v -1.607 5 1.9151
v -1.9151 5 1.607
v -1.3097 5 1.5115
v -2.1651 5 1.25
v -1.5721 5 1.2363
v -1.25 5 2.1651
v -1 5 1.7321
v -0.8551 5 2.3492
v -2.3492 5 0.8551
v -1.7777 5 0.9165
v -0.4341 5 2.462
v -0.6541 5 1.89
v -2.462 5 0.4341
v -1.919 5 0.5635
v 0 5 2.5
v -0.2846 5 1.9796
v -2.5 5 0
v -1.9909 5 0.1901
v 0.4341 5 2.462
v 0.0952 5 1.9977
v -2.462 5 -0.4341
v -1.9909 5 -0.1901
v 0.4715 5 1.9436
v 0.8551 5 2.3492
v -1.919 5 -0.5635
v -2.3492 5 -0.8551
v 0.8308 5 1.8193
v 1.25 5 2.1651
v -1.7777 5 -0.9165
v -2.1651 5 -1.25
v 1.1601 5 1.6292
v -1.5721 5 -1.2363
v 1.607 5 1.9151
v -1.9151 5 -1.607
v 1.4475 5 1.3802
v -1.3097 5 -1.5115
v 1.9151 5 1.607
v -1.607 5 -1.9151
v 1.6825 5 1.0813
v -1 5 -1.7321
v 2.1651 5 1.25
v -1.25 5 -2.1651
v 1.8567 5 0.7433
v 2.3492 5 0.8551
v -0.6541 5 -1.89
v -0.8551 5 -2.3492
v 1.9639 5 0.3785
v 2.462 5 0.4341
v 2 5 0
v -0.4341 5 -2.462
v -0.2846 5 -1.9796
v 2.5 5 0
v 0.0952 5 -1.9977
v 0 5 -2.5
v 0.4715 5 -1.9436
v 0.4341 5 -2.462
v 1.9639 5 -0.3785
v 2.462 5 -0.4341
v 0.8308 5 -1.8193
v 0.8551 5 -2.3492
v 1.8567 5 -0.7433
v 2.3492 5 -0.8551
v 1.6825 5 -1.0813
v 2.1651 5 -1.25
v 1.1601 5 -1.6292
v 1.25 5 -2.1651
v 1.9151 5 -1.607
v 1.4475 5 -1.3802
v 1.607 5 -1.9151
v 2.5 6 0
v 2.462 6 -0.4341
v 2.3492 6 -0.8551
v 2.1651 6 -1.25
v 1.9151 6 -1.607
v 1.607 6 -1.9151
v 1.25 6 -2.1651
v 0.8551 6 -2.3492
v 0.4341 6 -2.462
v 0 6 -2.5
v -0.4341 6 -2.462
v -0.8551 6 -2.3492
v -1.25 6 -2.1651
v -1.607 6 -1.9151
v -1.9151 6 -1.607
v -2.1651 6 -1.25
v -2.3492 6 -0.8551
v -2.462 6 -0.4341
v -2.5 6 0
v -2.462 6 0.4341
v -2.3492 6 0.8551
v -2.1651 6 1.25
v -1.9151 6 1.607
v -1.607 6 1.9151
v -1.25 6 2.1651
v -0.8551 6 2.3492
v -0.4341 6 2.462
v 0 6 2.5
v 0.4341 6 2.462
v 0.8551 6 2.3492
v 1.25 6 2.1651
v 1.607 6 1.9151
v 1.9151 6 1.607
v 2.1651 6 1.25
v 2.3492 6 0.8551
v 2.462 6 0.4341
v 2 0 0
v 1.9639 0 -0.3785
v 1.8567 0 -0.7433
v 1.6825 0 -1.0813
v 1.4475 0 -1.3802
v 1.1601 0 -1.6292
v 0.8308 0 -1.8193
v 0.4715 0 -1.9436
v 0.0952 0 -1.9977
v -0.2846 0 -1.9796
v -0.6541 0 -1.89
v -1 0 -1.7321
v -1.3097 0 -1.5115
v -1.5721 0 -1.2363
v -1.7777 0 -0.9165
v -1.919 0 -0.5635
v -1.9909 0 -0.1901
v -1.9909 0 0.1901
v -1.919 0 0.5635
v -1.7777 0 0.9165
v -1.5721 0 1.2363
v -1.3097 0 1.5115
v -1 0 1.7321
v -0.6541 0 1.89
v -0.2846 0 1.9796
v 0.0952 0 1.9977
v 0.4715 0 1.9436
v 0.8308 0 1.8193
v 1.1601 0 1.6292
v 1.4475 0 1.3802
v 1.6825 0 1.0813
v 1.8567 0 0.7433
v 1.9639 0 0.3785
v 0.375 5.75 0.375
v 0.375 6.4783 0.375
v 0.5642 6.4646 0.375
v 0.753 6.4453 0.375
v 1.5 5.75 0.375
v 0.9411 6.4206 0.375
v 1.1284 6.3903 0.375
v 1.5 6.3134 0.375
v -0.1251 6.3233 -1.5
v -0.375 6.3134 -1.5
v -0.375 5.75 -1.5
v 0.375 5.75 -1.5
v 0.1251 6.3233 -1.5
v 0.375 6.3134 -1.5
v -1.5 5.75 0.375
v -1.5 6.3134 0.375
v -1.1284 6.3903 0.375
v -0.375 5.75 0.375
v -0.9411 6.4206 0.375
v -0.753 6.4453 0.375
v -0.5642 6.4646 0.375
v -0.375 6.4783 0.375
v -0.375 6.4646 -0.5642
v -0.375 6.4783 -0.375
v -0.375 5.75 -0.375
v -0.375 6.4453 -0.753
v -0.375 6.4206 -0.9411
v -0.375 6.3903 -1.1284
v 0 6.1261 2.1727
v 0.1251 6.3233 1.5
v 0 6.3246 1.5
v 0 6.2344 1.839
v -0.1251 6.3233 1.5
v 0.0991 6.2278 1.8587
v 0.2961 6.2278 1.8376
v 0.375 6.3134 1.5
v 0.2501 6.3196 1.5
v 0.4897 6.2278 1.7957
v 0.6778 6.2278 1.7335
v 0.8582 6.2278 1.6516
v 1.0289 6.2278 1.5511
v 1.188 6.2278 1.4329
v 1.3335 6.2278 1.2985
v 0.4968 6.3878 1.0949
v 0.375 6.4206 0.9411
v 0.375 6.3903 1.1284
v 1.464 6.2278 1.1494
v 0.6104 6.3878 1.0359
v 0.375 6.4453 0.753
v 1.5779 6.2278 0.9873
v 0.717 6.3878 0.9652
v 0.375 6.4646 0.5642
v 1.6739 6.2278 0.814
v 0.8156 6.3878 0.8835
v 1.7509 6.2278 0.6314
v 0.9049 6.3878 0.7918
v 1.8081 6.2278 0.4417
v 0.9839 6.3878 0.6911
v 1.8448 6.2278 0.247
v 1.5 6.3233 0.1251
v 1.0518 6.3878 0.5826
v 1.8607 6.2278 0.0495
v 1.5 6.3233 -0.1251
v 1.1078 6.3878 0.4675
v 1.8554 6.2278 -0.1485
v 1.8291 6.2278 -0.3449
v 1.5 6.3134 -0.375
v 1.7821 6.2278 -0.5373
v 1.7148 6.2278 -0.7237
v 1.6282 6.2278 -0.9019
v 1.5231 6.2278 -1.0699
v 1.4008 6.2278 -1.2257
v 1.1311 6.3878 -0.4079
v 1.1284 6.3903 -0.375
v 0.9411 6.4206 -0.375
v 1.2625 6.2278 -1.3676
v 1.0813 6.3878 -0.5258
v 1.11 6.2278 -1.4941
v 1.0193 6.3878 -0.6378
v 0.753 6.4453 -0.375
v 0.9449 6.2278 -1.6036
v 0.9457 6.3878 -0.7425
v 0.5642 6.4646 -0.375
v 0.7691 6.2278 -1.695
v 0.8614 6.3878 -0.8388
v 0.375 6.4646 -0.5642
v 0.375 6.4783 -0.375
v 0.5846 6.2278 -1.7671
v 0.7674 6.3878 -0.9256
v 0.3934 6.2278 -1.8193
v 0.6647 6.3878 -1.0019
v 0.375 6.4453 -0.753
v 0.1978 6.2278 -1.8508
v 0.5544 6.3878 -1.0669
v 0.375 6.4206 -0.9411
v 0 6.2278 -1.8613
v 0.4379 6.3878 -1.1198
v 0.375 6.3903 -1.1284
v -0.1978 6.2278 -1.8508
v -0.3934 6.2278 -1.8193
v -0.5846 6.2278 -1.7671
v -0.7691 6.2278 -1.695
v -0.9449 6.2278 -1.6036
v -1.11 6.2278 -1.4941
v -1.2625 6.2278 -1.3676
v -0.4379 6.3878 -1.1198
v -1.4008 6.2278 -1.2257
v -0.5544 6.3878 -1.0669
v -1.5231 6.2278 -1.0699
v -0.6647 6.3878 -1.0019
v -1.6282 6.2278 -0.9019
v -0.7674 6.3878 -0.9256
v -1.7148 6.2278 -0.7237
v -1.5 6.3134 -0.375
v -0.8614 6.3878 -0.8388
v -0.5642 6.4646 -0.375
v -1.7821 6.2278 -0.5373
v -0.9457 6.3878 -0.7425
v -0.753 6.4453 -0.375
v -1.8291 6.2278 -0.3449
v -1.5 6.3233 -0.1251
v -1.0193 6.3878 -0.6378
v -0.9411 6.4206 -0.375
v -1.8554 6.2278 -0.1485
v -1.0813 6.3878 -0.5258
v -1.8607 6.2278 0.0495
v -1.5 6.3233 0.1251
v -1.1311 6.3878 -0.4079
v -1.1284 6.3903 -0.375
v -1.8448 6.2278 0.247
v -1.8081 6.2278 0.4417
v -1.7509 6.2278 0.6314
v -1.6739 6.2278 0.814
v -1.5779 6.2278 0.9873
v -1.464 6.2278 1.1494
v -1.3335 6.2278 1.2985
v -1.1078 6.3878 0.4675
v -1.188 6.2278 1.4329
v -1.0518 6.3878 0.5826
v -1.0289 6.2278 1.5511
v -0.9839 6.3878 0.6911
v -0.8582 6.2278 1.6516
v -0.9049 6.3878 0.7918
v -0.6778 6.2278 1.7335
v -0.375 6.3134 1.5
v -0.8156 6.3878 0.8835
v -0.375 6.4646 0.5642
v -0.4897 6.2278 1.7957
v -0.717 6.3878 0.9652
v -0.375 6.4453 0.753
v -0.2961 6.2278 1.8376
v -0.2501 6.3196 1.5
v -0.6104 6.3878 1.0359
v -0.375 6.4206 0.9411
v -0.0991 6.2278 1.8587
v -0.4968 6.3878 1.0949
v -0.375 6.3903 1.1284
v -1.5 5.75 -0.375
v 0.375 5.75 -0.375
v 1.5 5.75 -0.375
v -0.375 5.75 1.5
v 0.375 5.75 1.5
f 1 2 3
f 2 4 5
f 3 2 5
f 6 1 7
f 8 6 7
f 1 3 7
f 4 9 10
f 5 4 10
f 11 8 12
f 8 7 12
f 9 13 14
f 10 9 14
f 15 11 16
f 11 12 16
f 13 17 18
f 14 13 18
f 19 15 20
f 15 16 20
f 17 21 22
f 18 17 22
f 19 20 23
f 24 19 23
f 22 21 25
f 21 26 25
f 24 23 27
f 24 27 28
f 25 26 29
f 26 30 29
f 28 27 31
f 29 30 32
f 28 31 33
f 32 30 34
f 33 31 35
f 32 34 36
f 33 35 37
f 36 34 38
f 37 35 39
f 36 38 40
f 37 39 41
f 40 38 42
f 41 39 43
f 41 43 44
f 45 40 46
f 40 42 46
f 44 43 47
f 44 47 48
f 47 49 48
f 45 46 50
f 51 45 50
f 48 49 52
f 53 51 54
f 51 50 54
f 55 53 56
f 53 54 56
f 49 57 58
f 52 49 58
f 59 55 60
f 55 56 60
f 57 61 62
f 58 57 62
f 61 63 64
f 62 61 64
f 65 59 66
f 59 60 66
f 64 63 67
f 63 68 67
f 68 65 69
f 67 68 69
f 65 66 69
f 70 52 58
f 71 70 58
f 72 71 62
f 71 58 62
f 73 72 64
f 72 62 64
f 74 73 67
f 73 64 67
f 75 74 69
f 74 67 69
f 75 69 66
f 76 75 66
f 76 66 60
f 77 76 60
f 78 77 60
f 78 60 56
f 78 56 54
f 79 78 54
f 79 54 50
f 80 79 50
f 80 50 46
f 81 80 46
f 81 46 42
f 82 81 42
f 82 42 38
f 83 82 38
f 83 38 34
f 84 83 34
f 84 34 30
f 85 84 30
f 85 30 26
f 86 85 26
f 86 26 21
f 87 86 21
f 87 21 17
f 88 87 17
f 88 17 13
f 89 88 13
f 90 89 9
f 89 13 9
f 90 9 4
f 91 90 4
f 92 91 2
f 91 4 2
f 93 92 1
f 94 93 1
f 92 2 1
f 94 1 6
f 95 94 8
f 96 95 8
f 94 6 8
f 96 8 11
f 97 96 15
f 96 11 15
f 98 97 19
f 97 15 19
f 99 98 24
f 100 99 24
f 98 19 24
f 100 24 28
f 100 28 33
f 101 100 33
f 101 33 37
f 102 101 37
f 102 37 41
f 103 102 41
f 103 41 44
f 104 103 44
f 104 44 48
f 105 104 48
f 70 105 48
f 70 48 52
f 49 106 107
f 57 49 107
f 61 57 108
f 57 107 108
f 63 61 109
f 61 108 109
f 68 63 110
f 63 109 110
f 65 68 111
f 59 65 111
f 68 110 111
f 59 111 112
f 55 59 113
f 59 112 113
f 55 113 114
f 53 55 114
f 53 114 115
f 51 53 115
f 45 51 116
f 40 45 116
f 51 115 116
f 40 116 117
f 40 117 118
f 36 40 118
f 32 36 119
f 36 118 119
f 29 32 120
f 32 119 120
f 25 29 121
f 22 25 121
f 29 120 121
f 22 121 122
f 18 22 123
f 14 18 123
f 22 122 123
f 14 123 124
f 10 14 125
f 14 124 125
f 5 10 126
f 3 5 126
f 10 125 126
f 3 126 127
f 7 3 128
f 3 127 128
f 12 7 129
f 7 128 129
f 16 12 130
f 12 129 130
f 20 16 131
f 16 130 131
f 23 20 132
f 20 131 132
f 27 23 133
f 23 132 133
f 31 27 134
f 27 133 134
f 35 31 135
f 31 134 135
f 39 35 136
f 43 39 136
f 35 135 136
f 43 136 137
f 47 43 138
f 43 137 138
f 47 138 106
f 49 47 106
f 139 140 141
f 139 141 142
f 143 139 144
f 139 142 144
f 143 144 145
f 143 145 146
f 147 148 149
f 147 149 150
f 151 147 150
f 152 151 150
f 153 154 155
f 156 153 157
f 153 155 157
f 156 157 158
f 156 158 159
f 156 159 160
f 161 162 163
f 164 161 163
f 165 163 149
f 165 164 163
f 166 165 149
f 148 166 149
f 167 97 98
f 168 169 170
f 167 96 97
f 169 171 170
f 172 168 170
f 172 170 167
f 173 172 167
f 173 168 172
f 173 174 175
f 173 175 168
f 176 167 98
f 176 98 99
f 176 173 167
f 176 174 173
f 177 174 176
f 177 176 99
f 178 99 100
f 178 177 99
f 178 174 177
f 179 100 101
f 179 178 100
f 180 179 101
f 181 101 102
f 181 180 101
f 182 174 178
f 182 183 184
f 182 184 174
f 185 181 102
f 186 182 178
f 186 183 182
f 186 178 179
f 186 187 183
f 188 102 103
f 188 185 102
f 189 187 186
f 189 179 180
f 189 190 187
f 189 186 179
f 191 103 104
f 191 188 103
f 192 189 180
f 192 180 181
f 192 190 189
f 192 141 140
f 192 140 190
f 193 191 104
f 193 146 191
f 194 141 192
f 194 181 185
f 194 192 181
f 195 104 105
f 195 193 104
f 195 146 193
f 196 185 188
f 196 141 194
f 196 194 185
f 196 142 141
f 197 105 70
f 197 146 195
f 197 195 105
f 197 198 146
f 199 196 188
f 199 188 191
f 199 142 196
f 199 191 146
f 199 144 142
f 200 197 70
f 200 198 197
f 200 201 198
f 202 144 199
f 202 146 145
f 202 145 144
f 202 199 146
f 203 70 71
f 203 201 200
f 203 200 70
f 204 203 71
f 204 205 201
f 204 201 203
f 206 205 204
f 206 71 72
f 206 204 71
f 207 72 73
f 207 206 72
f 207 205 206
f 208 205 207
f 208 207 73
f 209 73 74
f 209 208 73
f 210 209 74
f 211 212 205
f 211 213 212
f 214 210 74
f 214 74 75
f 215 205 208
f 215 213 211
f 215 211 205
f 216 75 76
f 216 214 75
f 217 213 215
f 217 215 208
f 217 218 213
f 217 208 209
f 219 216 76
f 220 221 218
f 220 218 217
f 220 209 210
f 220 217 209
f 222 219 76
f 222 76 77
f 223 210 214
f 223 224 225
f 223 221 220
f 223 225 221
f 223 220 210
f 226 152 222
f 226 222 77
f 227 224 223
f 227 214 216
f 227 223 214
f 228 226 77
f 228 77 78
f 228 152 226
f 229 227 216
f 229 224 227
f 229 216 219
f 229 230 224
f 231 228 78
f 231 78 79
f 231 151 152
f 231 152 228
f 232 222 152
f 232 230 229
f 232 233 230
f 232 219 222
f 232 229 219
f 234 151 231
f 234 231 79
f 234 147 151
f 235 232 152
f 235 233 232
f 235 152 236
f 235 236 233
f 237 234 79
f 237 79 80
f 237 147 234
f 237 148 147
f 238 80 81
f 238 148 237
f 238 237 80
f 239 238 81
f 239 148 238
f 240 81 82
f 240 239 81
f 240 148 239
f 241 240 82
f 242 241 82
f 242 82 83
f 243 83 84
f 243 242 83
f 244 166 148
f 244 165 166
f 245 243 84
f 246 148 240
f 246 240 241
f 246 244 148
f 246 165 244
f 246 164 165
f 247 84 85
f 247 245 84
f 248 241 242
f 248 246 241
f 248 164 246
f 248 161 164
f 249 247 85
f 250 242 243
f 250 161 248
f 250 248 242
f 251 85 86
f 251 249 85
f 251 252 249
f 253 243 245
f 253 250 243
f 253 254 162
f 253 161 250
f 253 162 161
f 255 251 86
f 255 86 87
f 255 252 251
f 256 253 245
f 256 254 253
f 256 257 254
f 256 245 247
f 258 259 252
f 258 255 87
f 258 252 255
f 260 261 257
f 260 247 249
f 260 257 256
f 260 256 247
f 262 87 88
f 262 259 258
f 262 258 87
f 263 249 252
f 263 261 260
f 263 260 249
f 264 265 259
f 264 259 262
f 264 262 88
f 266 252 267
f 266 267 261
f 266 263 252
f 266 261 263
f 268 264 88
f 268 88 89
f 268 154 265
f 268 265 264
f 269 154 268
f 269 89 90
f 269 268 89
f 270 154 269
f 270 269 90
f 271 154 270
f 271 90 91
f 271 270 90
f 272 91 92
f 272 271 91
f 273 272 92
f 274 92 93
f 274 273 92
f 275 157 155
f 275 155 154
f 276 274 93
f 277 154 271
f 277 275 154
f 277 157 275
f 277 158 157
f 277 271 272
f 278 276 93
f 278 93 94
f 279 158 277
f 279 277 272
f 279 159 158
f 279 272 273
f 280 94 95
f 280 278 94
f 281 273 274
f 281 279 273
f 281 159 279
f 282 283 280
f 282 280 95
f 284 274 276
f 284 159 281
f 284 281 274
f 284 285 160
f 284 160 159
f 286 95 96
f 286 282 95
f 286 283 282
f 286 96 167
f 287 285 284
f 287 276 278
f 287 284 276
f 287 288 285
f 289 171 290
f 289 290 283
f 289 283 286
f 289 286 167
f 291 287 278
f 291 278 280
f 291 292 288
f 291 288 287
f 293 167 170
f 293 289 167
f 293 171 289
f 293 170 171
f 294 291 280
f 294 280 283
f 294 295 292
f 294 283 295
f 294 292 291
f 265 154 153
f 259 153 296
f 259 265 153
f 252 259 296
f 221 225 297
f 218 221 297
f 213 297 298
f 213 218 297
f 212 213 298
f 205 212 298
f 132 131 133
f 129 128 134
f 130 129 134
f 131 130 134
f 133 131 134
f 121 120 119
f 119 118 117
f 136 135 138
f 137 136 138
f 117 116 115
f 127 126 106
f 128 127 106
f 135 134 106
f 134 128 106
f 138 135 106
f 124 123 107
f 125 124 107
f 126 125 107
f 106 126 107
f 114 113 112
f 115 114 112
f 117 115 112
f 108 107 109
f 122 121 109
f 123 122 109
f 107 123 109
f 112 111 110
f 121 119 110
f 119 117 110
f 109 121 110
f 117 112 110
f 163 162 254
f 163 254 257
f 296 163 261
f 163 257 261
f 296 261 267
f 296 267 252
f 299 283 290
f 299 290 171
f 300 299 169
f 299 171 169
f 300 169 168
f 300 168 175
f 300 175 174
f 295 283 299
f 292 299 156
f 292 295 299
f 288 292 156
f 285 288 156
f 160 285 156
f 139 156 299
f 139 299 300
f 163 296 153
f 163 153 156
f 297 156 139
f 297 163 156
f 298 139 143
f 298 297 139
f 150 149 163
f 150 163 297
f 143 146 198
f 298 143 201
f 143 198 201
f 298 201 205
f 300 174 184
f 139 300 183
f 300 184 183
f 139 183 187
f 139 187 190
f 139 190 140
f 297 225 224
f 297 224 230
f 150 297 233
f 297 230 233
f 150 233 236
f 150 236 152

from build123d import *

# Parameters (mm, degrees)
SKETCH1_R           = 2
BOSS_EXTRUDE1_DEPTH = 5
SKETCH2_R           = 2.5
BOSS_EXTRUDE2_DEPTH = 1
DOME1_FACE_RADIUS   = 2.5
DOME1_HEIGHT        = 0.5
SKETCH3_W           = 1.125
SKETCH3_H           = 0.75
SKETCH3_W_2         = 0.75
SKETCH3_H_2         = 1.125
CUT_EXTRUDE1_DEPTH  = 0.75


with BuildPart() as part:
    # Sketch1 → Boss-Extrude1 (new body)
    with BuildSketch(Plane(origin=(0, 0, 0), x_dir=(1, 0, 0), z_dir=(0, 1, 0))):
        Circle(SKETCH1_R)
    extrude(amount=BOSS_EXTRUDE1_DEPTH)

    # Sketch2 → Boss-Extrude2 (add)
    with BuildSketch(Plane(origin=(0, 5, 0), x_dir=(1, 0, 0), z_dir=(0, 1, 0))):
        Circle(SKETCH2_R)
    extrude(amount=BOSS_EXTRUDE2_DEPTH)

    # Dome1: a dome of height H over a round flat face of radius A is a cap of a sphere of radius (A * A + H * H) / (2 * H)
    dome1_r = (DOME1_FACE_RADIUS * DOME1_FACE_RADIUS + DOME1_HEIGHT * DOME1_HEIGHT) / (2 * DOME1_HEIGHT)
    dome1_base = Plane((0, 6, 0), z_dir=(0, 1, 0))
    with Locations(dome1_base.offset(DOME1_HEIGHT - dome1_r)):
        dome1_ball = Sphere(dome1_r, mode=Mode.PRIVATE)
    add(split(dome1_ball, bisect_by=dome1_base, keep=Keep.TOP, mode=Mode.PRIVATE))

    # Sketch3 → Cut-Extrude1 (cut)
    with BuildSketch(Plane(origin=(0, 6.5, 0), x_dir=(1, 0, 0), z_dir=(0, 1, 0))):
        with Locations((-0.9375, 0)):
            Rectangle(SKETCH3_W, SKETCH3_H)
        Rectangle(SKETCH3_W_2, SKETCH3_H)
        with Locations((0, 0.9375)):
            Rectangle(SKETCH3_W_2, SKETCH3_H_2)
        with Locations((0.9375, 0)):
            Rectangle(SKETCH3_W, SKETCH3_H)
        with Locations((0, -0.9375)):
            Rectangle(SKETCH3_W_2, SKETCH3_H_2)
    extrude(amount=-CUT_EXTRUDE1_DEPTH, mode=Mode.SUBTRACT)


solid = part.part
